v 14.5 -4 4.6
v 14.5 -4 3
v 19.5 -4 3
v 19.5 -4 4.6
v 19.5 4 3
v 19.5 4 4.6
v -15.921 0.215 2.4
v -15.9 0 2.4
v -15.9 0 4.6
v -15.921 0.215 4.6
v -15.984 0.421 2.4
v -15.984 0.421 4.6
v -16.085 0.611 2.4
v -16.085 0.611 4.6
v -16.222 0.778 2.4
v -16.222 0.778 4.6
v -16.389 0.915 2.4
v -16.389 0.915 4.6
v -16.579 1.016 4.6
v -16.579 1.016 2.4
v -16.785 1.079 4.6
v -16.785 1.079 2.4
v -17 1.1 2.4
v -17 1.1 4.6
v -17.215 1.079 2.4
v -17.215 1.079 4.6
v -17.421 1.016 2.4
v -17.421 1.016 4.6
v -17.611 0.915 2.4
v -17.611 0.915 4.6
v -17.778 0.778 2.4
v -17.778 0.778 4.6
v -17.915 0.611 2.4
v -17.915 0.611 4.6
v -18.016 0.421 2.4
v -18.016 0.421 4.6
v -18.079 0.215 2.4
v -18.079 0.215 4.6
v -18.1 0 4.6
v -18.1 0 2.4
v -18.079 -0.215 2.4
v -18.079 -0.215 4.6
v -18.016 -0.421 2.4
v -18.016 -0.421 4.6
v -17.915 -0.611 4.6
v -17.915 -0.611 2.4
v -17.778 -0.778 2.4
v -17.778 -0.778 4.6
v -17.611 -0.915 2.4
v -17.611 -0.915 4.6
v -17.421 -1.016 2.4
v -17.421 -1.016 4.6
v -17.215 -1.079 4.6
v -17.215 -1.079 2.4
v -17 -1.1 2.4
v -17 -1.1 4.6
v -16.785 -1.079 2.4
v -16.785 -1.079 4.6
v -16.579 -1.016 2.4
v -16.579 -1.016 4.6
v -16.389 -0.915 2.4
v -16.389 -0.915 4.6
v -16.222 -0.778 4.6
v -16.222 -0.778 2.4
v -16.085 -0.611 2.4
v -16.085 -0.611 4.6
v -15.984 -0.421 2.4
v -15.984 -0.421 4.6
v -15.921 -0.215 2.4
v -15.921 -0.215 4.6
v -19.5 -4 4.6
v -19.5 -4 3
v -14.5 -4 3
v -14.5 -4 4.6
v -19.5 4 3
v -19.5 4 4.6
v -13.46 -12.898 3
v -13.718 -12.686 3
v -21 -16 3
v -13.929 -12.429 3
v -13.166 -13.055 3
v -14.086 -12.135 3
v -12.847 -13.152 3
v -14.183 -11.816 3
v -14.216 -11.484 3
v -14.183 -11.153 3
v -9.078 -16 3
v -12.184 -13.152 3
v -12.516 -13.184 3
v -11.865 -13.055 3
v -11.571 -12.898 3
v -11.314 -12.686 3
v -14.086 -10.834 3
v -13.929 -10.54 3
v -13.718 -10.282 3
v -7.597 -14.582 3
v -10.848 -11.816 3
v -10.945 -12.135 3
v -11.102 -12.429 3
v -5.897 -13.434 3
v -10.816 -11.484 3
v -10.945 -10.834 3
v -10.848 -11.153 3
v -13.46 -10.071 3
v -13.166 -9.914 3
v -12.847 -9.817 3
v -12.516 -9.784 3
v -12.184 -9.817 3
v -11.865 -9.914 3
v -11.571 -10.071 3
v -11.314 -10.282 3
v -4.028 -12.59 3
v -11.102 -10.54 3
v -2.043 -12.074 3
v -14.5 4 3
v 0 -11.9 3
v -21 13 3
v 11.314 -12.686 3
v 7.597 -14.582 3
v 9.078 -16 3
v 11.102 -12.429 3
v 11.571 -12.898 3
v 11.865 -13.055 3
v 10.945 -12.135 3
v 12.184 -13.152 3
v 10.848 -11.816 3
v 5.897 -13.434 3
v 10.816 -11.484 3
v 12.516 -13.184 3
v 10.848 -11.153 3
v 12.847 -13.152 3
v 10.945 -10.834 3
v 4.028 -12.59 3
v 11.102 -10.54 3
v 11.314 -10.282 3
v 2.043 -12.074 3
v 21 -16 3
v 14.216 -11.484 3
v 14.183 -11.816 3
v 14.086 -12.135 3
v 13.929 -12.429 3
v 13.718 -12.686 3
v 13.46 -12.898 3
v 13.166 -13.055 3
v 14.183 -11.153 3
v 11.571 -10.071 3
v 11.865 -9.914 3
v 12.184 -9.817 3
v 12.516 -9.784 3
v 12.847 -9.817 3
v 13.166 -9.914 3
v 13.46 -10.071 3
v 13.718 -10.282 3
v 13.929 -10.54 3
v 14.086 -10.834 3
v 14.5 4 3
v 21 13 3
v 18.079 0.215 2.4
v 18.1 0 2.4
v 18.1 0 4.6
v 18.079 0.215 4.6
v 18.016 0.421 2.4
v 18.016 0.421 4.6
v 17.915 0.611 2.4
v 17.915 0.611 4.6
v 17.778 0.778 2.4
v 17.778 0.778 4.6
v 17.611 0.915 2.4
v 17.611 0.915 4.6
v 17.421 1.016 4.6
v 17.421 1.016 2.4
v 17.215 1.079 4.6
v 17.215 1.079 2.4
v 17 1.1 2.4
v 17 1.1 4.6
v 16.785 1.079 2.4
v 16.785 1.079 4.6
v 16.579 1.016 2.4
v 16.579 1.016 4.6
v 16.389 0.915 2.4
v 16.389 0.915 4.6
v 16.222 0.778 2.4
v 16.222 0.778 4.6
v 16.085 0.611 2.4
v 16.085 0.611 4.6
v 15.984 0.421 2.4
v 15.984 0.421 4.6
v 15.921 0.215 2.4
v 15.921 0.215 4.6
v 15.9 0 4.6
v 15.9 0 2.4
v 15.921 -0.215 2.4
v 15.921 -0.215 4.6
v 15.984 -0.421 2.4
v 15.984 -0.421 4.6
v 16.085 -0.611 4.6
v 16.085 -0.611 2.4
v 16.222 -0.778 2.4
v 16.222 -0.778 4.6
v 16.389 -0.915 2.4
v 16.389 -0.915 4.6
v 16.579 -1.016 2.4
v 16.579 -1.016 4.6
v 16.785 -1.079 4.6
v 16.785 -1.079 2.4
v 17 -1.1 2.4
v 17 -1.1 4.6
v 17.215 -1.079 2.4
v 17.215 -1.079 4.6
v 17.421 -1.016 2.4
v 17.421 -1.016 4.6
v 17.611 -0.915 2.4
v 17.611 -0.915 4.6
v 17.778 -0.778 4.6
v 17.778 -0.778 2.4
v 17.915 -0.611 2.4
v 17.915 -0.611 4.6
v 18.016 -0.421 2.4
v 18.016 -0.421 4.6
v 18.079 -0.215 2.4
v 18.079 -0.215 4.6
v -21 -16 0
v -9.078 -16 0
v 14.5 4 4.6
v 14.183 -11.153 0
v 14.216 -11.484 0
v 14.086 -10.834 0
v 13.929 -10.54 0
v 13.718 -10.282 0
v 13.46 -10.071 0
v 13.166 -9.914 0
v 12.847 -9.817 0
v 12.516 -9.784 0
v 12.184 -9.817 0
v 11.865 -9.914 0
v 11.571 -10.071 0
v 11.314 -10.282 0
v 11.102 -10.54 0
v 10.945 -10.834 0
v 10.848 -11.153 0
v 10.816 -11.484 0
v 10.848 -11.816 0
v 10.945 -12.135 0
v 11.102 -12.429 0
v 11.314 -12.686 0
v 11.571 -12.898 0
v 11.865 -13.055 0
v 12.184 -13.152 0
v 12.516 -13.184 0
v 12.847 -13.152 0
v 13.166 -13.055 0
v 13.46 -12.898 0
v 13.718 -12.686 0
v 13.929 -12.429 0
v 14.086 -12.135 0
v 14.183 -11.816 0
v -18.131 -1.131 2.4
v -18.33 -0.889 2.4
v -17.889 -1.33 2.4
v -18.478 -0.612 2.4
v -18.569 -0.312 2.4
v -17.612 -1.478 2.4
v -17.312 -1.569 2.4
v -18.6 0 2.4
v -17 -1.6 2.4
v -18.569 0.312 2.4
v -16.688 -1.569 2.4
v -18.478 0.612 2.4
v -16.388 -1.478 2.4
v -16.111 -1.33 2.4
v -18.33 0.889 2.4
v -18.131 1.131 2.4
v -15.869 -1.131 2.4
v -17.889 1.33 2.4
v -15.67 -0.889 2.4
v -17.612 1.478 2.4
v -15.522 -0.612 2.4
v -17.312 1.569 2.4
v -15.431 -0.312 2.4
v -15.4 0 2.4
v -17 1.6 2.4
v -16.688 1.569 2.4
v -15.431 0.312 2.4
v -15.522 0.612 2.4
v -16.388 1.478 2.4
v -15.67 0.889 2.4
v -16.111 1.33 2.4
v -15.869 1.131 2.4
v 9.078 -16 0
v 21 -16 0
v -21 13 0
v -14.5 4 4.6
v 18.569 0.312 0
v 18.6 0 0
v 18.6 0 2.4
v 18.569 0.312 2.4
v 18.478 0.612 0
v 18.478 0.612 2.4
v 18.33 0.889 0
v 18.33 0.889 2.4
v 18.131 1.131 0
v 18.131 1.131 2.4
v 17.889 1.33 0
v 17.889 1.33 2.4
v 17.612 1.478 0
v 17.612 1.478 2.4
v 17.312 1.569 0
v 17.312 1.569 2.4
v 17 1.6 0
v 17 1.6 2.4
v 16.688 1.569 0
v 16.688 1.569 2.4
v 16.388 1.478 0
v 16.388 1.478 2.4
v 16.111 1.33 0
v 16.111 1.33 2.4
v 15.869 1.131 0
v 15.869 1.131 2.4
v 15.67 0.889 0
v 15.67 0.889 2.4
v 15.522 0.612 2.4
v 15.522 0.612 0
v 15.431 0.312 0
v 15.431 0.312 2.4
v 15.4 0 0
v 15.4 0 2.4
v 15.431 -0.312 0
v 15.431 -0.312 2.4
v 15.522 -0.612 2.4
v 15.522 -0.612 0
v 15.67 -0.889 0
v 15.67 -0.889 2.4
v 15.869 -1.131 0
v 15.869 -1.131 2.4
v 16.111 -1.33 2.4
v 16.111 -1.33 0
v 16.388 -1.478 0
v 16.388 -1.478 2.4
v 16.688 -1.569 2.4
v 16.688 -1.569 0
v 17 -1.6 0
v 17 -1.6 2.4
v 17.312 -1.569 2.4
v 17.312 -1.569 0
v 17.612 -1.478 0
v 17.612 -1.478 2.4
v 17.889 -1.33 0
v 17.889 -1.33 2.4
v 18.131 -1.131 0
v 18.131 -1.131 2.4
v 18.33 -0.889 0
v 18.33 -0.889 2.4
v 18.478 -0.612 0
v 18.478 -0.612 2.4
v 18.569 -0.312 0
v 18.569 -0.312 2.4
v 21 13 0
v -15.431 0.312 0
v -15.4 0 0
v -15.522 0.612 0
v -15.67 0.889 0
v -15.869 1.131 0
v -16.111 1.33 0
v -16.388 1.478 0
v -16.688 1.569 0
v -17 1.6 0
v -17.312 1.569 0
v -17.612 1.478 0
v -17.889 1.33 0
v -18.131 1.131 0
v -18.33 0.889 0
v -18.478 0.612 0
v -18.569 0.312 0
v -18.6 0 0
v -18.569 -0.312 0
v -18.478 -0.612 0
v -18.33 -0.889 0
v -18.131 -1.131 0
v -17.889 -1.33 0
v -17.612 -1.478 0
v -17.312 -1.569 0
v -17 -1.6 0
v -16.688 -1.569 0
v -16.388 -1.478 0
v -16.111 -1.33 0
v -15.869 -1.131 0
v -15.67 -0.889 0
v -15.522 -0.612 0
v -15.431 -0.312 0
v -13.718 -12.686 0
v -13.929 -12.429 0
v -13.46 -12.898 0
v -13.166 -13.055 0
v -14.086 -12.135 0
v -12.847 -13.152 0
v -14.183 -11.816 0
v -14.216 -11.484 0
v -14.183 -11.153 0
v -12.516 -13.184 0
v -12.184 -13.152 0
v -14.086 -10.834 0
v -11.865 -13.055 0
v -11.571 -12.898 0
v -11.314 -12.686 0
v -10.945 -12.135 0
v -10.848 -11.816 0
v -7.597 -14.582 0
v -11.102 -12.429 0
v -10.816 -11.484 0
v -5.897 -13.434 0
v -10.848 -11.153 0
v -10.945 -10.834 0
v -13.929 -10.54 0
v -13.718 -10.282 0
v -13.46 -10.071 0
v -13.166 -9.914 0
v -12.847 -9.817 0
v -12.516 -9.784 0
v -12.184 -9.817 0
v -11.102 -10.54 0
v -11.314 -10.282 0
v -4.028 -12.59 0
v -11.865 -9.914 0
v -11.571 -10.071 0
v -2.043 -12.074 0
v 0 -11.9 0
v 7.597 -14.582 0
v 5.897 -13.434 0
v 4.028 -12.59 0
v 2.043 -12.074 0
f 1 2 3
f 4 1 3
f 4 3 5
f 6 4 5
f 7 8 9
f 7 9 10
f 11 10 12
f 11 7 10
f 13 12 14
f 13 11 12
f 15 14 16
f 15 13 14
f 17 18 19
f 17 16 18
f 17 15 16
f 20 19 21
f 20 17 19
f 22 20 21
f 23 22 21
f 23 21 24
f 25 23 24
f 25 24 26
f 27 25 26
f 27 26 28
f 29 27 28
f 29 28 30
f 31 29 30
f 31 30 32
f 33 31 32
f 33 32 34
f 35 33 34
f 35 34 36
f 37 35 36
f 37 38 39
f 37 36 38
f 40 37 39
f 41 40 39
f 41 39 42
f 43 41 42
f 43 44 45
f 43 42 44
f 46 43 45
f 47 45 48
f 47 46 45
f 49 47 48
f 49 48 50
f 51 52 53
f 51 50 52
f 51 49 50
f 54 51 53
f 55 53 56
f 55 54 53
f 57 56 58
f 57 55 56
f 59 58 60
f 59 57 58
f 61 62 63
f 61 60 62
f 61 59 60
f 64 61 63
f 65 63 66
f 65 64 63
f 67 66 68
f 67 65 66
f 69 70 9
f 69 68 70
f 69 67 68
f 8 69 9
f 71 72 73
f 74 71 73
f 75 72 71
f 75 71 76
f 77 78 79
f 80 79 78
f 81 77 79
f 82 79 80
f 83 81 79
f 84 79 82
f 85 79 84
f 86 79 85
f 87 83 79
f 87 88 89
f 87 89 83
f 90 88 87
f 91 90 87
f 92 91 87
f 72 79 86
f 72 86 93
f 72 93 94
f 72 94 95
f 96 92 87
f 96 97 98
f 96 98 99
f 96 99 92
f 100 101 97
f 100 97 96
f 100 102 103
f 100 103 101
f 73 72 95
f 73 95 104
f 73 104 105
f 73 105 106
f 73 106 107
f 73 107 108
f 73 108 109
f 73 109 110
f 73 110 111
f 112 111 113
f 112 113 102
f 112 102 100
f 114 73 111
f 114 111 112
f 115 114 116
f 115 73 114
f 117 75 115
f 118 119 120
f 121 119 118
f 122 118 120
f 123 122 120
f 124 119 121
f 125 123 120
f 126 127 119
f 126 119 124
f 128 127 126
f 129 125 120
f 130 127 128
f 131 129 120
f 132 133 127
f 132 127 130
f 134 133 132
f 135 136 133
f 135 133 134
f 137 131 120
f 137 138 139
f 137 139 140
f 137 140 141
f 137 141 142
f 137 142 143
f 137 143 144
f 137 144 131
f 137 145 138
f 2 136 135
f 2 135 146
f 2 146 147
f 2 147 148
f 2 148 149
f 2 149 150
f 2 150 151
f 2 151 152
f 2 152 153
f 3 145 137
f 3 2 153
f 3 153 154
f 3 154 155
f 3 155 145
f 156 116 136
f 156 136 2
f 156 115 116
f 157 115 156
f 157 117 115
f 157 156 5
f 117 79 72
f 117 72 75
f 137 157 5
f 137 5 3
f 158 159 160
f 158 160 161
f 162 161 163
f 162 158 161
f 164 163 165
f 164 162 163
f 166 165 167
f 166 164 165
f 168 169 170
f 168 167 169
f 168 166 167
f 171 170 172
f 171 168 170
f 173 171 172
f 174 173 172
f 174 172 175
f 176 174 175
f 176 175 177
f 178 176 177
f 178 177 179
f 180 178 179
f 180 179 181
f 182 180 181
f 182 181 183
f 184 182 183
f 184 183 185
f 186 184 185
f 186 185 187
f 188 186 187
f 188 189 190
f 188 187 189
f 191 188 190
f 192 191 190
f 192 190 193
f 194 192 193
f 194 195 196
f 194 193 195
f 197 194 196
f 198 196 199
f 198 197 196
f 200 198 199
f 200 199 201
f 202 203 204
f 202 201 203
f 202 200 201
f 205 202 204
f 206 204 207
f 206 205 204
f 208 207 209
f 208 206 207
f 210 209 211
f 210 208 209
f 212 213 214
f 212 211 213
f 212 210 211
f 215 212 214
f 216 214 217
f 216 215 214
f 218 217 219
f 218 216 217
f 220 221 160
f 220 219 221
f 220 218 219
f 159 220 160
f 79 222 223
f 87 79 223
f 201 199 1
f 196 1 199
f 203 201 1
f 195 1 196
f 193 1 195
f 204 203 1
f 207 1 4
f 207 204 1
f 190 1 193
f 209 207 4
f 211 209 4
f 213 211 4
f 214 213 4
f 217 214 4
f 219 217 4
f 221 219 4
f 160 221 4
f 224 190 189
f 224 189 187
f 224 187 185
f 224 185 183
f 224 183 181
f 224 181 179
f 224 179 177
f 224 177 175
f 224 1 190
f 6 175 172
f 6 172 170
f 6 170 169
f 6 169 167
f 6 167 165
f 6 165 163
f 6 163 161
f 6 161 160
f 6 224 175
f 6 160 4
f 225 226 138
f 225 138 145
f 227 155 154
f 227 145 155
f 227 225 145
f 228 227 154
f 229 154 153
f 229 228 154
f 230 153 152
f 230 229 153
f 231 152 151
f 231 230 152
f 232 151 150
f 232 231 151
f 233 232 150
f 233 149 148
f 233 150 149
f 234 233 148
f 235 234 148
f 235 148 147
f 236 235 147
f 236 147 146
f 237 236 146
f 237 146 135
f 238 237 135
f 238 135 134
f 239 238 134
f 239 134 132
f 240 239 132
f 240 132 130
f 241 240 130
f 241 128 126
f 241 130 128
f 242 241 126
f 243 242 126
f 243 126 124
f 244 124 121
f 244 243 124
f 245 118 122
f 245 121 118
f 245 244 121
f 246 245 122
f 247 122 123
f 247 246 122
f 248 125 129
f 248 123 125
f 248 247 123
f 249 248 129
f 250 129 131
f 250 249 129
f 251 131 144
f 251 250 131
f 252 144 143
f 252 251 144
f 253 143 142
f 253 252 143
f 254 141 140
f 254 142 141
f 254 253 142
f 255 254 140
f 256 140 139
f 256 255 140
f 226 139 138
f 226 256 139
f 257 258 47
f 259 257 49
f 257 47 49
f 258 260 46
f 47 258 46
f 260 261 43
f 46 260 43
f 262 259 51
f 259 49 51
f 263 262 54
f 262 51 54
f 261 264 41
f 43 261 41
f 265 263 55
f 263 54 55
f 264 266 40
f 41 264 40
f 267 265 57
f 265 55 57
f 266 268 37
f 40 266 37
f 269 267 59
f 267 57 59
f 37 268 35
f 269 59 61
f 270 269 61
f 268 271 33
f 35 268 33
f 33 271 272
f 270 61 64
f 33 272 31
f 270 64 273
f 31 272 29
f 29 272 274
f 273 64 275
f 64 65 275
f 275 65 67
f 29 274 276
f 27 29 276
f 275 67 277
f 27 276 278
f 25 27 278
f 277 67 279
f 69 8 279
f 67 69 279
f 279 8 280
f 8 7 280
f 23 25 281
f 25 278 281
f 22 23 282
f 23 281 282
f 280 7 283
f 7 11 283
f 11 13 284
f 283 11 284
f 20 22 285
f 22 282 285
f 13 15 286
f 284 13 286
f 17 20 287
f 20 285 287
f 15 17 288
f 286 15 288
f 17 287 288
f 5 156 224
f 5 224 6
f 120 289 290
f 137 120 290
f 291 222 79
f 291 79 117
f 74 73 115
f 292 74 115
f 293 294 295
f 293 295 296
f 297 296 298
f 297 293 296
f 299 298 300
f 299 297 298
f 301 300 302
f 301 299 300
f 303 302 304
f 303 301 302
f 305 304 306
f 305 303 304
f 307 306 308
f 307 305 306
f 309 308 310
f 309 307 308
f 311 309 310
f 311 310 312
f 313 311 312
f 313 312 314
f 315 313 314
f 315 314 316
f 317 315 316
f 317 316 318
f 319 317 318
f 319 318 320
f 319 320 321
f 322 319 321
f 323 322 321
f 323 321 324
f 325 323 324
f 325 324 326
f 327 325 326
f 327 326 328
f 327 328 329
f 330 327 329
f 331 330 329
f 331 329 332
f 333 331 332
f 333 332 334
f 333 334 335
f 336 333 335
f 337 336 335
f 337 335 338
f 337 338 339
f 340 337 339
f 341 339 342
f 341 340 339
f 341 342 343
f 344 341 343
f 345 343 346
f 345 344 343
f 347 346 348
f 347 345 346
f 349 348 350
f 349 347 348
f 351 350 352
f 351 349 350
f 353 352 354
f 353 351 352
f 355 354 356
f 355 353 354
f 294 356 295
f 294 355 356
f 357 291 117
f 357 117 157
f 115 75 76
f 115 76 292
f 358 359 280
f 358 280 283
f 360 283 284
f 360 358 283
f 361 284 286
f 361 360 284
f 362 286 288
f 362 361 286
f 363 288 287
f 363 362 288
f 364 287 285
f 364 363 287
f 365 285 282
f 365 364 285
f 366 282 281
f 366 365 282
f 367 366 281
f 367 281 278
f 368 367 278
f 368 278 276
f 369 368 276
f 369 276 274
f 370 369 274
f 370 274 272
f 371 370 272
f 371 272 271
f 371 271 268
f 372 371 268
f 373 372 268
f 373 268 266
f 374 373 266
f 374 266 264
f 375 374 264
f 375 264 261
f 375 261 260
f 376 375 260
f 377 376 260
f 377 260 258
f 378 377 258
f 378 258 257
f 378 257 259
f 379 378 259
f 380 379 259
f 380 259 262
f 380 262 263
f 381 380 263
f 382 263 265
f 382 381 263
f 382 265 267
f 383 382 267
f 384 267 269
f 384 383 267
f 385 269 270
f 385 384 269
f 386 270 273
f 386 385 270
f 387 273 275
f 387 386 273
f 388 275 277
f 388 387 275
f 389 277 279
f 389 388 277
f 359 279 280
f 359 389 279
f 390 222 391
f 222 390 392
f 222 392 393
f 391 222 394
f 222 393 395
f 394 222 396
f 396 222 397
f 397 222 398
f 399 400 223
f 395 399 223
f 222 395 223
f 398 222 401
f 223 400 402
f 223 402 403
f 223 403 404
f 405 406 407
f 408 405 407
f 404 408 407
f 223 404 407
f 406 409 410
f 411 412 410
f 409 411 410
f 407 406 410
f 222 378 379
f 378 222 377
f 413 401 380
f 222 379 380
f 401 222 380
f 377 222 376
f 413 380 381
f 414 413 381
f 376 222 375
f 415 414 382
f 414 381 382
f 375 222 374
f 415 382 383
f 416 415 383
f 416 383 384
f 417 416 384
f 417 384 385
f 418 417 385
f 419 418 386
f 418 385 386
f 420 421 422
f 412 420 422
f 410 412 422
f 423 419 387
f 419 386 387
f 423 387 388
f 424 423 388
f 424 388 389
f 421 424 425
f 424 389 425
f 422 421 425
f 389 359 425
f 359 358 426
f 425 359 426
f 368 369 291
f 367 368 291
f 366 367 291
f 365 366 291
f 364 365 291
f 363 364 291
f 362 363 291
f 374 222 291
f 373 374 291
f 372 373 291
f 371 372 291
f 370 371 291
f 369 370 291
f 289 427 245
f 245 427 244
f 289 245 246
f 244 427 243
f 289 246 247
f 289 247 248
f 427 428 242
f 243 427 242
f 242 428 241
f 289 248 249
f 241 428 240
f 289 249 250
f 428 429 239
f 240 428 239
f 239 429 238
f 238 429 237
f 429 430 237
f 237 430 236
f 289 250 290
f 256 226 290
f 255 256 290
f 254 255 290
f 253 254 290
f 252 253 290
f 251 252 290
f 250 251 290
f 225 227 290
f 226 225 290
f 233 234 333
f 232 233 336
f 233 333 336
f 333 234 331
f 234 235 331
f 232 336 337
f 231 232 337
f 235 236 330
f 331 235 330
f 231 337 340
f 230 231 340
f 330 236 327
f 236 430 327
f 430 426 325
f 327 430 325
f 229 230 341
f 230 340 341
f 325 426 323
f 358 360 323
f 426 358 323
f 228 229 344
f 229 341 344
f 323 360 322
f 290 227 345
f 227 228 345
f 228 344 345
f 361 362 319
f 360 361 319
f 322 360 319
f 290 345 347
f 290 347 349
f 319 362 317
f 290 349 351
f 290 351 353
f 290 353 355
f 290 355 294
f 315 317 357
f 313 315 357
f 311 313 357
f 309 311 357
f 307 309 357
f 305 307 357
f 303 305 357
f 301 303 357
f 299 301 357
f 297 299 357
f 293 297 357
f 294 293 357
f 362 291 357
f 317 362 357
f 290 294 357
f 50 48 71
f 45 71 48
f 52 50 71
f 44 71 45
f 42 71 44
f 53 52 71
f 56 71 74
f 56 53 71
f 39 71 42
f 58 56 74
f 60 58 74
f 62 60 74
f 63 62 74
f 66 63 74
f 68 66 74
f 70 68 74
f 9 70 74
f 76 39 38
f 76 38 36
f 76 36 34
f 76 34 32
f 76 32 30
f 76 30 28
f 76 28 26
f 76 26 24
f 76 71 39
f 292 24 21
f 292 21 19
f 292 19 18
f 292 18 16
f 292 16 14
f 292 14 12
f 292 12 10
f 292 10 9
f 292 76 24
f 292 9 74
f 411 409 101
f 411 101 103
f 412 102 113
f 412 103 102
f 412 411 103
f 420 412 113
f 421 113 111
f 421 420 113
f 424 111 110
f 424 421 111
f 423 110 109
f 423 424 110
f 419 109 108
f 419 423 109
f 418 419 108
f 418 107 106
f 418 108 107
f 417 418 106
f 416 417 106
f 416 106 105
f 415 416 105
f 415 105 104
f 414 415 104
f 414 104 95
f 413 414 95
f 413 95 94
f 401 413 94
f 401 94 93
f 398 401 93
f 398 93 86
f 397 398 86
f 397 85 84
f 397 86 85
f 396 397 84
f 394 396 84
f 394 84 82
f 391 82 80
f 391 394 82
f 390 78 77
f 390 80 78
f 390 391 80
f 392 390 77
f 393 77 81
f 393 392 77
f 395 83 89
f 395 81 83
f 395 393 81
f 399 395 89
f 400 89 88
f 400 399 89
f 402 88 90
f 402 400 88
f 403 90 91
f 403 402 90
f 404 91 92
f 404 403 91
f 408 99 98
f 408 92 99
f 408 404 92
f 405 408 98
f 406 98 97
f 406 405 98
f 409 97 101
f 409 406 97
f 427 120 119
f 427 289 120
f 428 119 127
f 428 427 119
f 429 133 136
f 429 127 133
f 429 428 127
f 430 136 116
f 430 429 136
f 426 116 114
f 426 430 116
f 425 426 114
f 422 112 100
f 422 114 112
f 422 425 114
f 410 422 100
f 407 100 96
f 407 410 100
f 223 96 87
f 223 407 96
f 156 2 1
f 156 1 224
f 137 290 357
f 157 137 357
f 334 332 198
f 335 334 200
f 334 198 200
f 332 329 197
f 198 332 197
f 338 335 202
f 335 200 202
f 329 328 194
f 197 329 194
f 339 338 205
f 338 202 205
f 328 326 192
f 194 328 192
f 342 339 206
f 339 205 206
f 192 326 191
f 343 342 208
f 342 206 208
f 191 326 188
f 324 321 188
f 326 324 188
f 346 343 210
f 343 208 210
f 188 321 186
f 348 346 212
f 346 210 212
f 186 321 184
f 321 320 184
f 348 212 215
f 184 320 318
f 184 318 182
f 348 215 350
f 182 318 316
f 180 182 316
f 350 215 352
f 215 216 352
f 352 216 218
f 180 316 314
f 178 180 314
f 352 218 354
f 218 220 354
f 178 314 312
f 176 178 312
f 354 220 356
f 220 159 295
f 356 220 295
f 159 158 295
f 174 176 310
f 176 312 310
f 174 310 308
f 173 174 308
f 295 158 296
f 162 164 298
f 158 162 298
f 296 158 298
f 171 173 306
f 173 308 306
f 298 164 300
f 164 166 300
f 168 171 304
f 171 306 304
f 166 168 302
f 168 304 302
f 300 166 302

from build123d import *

# Parameters (mm, degrees)
MOUNTING_PLATE_SKETCH_W        = 42
MOUNTING_PLATE_SKETCH_H        = 29
MOUNTING_PLATE_DEPTH           = 3
AXLE_COLLAR_CLEARANCE_SKETCH_R = 12.1
AXLE_COLLAR_CLEARANCE_DEPTH    = 3.2
M3_CAP_BOLT_HOLE_1_SKETCH_R    = 1.7
M3_CAP_BOLT_HOLE_1_DEPTH       = 3.2
M3_CAP_BOLT_HOLE_2_SKETCH_R    = 1.7
M3_CAP_BOLT_HOLE_2_DEPTH       = 3.2
CLAMP_SEAT_1_SKETCH_W          = 5
CLAMP_SEAT_1_SKETCH_H          = 8
CLAMP_SEAT_1_DEPTH             = 1.7
M2_SCREW_CLEARANCE_1_SKETCH_R  = 1.1
M2_SCREW_CLEARANCE_1_DEPTH     = 4.8
M2_INSERT_POCKET_1_SKETCH_R    = 1.6
M2_INSERT_POCKET_1_DEPTH       = 2.5
CLAMP_SEAT_2_SKETCH_W          = 5
CLAMP_SEAT_2_SKETCH_H          = 8
CLAMP_SEAT_2_DEPTH             = 1.7
M2_SCREW_CLEARANCE_2_SKETCH_R  = 1.1
M2_SCREW_CLEARANCE_2_DEPTH     = 4.8
M2_INSERT_POCKET_2_SKETCH_R    = 1.6
M2_INSERT_POCKET_2_DEPTH       = 2.5


with BuildPart() as part:
    # Mounting Plate Sketch → Mounting Plate (new body)
    with BuildSketch(Plane.XY):
        with Locations((0, -1.5)):
            Rectangle(MOUNTING_PLATE_SKETCH_W, MOUNTING_PLATE_SKETCH_H)
    extrude(amount=MOUNTING_PLATE_DEPTH)

    # Axle Collar Clearance Sketch → Axle Collar Clearance (cut)
    with BuildSketch(Plane.XY.offset(-0.1)):
        with Locations((0, -24)):
            Circle(AXLE_COLLAR_CLEARANCE_SKETCH_R)
    extrude(amount=AXLE_COLLAR_CLEARANCE_DEPTH, mode=Mode.SUBTRACT)

    # M3 Cap Bolt Hole 1 Sketch → M3 Cap Bolt Hole 1 (cut)
    with BuildSketch(Plane.XY.offset(-0.1)):
        with Locations((-12.515790027, -11.484209973)):
            Circle(M3_CAP_BOLT_HOLE_1_SKETCH_R)
    extrude(amount=M3_CAP_BOLT_HOLE_1_DEPTH, mode=Mode.SUBTRACT)

    # M3 Cap Bolt Hole 2 Sketch → M3 Cap Bolt Hole 2 (cut)
    with BuildSketch(Plane.XY.offset(-0.1)):
        with Locations((12.515790027, -11.484209973)):
            Circle(M3_CAP_BOLT_HOLE_2_SKETCH_R)
    extrude(amount=M3_CAP_BOLT_HOLE_2_DEPTH, mode=Mode.SUBTRACT)

    # Clamp Seat 1 Sketch → Clamp Seat 1 (add)
    with BuildSketch(Plane.XY.offset(2.9)):
        with Locations((-17, 0)):
            Rectangle(CLAMP_SEAT_1_SKETCH_W, CLAMP_SEAT_1_SKETCH_H)
    extrude(amount=CLAMP_SEAT_1_DEPTH)

    # M2 Screw Clearance 1 Sketch → M2 Screw Clearance 1 (cut)
    with BuildSketch(Plane.XY.offset(-0.1)):
        with Locations((-17, 0)):
            Circle(M2_SCREW_CLEARANCE_1_SKETCH_R)
    extrude(amount=M2_SCREW_CLEARANCE_1_DEPTH, mode=Mode.SUBTRACT)

    # M2 Insert Pocket 1 Sketch → M2 Insert Pocket 1 (cut)
    with BuildSketch(Plane.XY.offset(-0.1)):
        with Locations((-17, 0)):
            Circle(M2_INSERT_POCKET_1_SKETCH_R)
    extrude(amount=M2_INSERT_POCKET_1_DEPTH, mode=Mode.SUBTRACT)

    # Clamp Seat 2 Sketch → Clamp Seat 2 (add)
    with BuildSketch(Plane.XY.offset(2.9)):
        with Locations((17, 0)):
            Rectangle(CLAMP_SEAT_2_SKETCH_W, CLAMP_SEAT_2_SKETCH_H)
    extrude(amount=CLAMP_SEAT_2_DEPTH)

    # M2 Screw Clearance 2 Sketch → M2 Screw Clearance 2 (cut)
    with BuildSketch(Plane.XY.offset(-0.1)):
        with Locations((17, 0)):
            Circle(M2_SCREW_CLEARANCE_2_SKETCH_R)
    extrude(amount=M2_SCREW_CLEARANCE_2_DEPTH, mode=Mode.SUBTRACT)

    # M2 Insert Pocket 2 Sketch → M2 Insert Pocket 2 (cut)
    with BuildSketch(Plane.XY.offset(-0.1)):
        with Locations((17, 0)):
            Circle(M2_INSERT_POCKET_2_SKETCH_R)
    extrude(amount=M2_INSERT_POCKET_2_DEPTH, mode=Mode.SUBTRACT)


solid = part.part
